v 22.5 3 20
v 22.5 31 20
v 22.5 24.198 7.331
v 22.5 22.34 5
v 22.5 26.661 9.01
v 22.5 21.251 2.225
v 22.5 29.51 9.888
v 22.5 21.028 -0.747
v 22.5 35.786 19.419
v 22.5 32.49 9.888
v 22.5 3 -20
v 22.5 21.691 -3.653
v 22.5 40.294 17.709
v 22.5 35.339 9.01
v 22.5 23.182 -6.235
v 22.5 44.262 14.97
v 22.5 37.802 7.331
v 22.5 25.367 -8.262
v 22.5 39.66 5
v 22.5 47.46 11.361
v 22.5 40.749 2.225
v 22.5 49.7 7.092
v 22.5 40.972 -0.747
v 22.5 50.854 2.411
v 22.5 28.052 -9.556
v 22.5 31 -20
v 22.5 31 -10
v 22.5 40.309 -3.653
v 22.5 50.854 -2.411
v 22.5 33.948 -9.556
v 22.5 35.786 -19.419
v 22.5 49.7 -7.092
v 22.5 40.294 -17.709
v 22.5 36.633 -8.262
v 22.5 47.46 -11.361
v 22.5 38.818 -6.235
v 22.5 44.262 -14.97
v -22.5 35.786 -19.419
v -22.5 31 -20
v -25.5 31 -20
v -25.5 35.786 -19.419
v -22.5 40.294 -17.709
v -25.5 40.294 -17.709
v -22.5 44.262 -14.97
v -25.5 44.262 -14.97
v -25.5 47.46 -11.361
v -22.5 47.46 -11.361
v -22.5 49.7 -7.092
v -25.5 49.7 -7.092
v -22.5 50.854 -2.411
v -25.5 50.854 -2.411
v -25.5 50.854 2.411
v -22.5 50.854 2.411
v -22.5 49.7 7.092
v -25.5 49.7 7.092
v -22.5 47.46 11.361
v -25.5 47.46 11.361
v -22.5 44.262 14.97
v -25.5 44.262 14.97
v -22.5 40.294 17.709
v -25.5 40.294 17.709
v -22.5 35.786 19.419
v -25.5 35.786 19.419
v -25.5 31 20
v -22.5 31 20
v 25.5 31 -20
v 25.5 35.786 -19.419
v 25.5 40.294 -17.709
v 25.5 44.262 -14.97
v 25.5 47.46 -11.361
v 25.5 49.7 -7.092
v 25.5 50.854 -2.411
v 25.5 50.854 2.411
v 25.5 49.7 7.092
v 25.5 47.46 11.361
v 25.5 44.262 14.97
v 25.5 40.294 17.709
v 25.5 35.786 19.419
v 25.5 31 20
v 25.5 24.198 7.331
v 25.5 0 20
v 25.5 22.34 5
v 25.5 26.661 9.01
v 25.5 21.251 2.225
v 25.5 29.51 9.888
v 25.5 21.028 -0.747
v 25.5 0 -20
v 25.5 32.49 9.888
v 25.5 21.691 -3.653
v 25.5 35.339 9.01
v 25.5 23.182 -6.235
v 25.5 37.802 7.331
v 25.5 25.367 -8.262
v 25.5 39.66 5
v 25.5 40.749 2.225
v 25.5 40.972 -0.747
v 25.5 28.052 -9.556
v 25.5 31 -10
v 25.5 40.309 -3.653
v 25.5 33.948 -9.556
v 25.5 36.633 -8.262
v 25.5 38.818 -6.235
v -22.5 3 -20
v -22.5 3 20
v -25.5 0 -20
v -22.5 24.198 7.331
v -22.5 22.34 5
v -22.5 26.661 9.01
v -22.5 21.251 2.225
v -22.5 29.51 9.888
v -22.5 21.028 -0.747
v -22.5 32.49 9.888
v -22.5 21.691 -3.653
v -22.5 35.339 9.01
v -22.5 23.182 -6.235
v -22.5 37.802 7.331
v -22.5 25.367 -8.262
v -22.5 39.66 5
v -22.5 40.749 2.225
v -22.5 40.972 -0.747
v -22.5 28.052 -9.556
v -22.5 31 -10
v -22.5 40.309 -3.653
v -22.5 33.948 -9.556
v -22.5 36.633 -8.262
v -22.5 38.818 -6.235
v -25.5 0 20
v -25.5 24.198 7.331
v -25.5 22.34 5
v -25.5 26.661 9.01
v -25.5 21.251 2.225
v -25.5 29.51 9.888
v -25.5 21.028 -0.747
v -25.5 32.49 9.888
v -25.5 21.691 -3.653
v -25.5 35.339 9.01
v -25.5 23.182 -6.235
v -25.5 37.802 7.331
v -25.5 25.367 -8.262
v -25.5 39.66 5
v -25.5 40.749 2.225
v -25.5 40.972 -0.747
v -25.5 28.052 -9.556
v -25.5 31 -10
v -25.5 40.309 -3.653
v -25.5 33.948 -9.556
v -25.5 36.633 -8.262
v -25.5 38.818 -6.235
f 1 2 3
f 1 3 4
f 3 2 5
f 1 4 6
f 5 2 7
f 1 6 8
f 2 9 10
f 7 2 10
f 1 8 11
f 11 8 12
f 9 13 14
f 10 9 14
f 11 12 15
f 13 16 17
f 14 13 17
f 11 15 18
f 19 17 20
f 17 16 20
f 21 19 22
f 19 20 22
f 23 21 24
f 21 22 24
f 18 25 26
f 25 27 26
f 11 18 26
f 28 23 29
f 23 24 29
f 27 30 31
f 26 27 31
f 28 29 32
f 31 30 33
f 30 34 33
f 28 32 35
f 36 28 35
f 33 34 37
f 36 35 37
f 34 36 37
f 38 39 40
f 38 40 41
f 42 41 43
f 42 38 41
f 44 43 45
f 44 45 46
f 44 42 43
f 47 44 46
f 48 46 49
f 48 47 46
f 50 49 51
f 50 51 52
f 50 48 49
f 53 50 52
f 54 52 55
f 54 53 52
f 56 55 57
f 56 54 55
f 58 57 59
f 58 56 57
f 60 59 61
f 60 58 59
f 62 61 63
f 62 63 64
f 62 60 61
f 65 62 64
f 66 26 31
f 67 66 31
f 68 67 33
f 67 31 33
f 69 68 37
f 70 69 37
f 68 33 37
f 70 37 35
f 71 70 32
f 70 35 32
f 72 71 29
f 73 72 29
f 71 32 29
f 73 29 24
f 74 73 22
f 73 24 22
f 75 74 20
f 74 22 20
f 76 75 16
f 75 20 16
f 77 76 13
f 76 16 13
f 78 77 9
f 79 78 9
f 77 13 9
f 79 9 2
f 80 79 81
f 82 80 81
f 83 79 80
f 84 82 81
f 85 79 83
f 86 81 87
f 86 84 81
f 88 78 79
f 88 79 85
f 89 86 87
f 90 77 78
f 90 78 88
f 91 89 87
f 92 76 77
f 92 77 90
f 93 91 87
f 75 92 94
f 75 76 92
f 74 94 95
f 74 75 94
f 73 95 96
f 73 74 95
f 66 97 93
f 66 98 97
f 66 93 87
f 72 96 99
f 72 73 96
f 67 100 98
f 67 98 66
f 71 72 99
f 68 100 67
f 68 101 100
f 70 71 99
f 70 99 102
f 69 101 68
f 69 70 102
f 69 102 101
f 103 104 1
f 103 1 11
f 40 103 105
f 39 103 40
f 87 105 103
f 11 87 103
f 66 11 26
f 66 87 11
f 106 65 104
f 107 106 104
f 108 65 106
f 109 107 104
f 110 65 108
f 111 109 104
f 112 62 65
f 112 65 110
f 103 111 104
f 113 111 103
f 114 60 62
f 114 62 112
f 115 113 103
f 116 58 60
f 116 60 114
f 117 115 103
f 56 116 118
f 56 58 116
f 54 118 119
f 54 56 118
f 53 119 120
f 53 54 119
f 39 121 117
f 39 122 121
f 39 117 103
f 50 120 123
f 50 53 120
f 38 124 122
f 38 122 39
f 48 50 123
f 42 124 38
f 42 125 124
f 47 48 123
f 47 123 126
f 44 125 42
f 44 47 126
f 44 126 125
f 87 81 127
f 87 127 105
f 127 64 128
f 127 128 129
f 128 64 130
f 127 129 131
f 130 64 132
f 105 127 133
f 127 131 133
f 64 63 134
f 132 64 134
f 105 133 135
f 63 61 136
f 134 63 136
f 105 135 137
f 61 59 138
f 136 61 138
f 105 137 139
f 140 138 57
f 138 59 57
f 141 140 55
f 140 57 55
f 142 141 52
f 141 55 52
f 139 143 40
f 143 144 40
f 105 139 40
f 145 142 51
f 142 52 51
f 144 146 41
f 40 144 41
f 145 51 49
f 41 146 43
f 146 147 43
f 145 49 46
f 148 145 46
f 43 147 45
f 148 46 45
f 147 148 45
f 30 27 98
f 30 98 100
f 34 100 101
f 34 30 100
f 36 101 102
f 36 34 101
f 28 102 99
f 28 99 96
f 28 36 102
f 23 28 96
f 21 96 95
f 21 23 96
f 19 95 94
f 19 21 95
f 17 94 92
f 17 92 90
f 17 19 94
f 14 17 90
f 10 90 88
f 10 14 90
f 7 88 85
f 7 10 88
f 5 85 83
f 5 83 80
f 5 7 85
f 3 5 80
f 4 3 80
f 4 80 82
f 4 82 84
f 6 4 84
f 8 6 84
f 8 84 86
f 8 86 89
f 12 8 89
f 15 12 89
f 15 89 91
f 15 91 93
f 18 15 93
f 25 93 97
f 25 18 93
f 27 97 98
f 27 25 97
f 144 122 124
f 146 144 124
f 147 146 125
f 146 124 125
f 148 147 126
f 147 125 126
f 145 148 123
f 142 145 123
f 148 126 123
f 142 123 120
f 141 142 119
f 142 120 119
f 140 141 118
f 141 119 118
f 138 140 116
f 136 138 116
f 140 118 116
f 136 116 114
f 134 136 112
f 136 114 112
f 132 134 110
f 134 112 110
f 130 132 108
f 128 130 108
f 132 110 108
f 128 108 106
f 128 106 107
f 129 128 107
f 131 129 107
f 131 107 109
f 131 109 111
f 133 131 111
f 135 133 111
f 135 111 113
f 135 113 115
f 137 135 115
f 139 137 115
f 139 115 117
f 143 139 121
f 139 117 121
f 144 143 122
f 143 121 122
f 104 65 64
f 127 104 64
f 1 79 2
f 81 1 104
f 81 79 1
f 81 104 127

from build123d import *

# Parameters (mm, degrees)
SKETCH_1_W      = 40
SKETCH_1_H      = 3
EXTRUDE_1_DEPTH = 22.5
SKETCH_2_R      = 10
EXTRUDE_2_DEPTH = 3


with BuildPart() as part:
    # 스케치1 → 보스-돌출1 (new, symmetric)
    with BuildSketch(Plane(origin=(0, 0, 0), x_dir=(0, 0, -1), z_dir=(1, 0, 0))):
        with Locations((0, 1.5)):
            Rectangle(SKETCH_1_W, SKETCH_1_H)
    extrude(amount=EXTRUDE_1_DEPTH, both=True)

    # 스케치2 → 보스-돌출2 (add)
    with BuildSketch(Plane(origin=(22.5, 0, 0), x_dir=(0, 0, -1), z_dir=(1, 0, 0))):
        with BuildLine():
            Line((-20, 31), (-20, 0))
            Line((-20, 0), (20, 0))
            Line((20, 0), (20, 31))
            ThreePointArc((20, 31), (0, 51), (-20, 31))
        make_face()
        with Locations((0, 31)):
            Circle(SKETCH_2_R, mode=Mode.SUBTRACT)
    extrude_2 = extrude(amount=EXTRUDE_2_DEPTH)

    # 대칭 복사1: 보스-돌출2 across plane
    add(extrude_2.mirror(Plane(origin=(0, 0, 0), x_dir=(0, 0, 1), z_dir=(1, 0, 0))))


solid = part.part
